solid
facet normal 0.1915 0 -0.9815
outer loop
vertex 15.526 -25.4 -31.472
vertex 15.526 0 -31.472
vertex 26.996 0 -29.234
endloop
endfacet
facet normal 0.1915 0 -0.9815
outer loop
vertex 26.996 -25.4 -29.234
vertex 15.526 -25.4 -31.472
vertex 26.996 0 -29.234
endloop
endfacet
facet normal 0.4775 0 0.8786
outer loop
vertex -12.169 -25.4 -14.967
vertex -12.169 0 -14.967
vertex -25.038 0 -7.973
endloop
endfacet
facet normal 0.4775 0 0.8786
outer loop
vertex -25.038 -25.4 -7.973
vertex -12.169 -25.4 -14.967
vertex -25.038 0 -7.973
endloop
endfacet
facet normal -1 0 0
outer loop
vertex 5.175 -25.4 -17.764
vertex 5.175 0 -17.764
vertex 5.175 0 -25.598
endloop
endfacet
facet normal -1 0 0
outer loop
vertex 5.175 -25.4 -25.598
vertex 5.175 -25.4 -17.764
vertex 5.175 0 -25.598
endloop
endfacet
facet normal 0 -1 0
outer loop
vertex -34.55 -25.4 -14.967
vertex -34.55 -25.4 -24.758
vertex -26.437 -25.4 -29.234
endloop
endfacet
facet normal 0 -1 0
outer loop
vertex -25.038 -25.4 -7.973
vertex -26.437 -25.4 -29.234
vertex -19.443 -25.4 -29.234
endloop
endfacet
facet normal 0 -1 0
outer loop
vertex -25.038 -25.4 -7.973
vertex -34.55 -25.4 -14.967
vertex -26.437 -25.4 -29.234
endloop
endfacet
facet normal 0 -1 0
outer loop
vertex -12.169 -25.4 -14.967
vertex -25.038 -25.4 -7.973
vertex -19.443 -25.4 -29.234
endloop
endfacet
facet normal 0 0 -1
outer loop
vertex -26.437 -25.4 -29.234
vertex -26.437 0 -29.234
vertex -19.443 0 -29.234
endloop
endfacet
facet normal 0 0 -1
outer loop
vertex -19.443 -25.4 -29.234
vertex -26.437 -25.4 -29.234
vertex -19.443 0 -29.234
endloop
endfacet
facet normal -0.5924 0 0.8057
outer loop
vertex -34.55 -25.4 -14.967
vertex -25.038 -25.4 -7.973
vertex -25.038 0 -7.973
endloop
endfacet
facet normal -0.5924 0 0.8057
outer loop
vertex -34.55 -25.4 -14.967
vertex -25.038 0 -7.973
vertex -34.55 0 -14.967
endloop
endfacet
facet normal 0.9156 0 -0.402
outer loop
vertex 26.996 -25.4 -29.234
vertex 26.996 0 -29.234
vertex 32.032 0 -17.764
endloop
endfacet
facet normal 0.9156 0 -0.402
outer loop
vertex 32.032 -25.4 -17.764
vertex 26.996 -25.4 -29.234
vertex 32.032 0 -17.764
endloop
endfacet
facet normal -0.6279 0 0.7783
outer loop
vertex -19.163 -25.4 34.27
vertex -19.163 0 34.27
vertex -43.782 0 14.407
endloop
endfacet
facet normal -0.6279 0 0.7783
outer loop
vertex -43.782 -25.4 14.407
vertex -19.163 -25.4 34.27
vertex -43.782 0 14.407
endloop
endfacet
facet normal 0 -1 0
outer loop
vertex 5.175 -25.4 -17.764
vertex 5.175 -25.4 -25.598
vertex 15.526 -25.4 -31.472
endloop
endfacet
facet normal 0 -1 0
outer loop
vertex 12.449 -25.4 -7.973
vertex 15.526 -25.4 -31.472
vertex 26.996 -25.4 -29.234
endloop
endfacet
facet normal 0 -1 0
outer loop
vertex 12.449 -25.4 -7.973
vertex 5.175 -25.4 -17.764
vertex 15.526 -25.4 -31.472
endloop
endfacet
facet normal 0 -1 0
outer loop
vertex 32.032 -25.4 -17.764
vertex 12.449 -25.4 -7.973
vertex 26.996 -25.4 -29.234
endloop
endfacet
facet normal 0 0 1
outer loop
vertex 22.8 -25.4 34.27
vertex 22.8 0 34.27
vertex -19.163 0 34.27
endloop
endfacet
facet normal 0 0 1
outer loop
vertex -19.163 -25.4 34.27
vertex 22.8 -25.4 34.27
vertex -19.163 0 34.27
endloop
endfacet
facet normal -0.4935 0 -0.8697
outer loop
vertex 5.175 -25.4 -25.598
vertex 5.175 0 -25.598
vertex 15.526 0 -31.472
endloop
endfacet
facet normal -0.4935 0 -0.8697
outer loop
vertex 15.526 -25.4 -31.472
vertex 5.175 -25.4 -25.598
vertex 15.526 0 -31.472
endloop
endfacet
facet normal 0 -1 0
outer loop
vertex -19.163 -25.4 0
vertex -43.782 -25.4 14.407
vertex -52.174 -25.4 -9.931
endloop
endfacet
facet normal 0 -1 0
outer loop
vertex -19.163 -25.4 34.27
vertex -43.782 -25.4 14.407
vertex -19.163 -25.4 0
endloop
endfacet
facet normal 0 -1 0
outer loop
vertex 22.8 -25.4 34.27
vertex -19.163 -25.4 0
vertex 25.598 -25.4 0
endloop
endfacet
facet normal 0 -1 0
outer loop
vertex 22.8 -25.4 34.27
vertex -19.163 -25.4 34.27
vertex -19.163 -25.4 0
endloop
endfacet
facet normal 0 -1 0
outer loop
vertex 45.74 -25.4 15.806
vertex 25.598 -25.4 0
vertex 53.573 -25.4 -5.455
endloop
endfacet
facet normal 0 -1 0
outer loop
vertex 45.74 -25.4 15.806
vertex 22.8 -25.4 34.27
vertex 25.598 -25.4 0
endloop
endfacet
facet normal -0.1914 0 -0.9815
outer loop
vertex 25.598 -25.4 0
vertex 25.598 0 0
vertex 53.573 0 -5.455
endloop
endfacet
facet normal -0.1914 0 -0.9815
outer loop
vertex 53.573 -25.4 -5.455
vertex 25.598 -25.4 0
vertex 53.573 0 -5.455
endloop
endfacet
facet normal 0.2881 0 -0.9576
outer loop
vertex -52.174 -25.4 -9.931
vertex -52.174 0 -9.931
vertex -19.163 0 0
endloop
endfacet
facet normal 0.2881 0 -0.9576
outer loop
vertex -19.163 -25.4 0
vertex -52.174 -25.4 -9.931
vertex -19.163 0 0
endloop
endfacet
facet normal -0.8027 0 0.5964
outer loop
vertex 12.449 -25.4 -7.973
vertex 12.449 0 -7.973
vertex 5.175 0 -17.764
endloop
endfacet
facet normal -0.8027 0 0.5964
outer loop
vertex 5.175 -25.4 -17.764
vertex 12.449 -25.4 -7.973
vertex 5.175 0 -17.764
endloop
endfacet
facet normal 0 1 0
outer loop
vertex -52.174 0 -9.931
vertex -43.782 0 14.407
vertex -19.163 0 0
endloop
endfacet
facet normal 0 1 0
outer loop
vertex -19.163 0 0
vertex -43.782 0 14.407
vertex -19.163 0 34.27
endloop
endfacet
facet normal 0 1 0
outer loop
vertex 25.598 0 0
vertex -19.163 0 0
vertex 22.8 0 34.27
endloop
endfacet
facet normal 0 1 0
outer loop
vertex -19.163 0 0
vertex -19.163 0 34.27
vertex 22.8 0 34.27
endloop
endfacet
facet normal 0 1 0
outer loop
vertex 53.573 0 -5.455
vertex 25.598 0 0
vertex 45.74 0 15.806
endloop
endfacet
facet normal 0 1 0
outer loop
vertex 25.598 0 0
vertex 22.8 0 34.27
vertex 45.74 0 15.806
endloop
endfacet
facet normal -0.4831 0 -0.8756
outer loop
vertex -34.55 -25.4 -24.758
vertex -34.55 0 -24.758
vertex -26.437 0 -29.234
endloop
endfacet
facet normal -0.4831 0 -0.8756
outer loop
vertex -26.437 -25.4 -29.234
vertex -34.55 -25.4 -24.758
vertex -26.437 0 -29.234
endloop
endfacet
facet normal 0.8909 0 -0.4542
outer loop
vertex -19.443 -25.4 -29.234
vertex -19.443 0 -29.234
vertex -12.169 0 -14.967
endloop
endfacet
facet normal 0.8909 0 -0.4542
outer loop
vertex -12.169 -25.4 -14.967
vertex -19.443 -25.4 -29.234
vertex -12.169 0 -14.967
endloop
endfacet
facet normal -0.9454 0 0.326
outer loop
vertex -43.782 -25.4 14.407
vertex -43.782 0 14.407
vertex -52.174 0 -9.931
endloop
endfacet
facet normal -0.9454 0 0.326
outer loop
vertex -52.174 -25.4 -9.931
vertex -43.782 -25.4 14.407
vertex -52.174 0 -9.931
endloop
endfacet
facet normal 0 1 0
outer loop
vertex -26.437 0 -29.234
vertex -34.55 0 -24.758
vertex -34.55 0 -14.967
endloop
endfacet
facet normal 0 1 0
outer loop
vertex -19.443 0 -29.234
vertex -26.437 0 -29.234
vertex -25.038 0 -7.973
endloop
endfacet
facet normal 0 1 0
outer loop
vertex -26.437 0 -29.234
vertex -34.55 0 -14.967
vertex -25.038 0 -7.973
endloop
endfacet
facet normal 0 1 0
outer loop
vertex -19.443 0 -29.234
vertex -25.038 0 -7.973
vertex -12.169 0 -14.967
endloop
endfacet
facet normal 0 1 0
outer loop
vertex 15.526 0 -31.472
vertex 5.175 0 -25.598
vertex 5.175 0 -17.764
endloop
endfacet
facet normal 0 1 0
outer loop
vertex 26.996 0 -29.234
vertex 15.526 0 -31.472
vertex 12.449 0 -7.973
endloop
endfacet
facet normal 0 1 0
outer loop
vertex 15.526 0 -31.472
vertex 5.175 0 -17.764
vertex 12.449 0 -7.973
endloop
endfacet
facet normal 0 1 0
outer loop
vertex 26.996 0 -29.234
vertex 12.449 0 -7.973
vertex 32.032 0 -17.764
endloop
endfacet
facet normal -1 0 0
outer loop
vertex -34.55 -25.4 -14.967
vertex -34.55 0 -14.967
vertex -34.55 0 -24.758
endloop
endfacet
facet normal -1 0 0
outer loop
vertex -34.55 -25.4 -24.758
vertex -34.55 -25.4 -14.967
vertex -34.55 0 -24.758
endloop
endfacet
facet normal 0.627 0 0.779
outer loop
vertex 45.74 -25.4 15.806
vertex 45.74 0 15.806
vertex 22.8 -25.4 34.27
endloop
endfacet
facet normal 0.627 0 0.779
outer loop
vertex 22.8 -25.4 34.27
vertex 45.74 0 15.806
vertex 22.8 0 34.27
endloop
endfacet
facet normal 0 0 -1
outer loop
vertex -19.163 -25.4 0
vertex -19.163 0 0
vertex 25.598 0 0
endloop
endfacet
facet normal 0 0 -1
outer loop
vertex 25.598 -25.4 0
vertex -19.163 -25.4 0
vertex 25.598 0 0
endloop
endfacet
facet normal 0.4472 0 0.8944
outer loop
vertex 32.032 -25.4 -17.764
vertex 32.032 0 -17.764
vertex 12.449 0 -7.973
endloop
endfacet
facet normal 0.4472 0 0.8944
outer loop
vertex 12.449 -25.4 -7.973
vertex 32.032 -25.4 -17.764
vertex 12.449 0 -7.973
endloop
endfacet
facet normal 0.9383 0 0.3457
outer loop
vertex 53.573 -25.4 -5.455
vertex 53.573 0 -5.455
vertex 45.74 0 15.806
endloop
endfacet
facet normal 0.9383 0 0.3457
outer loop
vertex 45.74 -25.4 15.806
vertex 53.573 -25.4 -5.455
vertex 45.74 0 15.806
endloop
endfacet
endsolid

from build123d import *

# Parameters (mm, degrees)
F1_DEPTH = 25.4
F3_DEPTH = 25.4


with BuildPart() as f1:
    # F0 (on Front) → F1 (new body)
    with BuildSketch(Plane.XZ):
        Polygon((-19.163234, 34.270018), (-43.781698, 14.407394), (-52.174352, -9.931311), (-19.163234, 0), (25.597604, 0), (53.573128, -5.455228), (45.739982, 15.806172), (22.800053, 34.270018), align=None)
    extrude(amount=F1_DEPTH)


with BuildPart() as f3:
    # F2 (on Front) → F3 (new body)
    with BuildSketch(Plane.XZ):
        Polygon((-12.169353, -14.966905), (-25.038095, -7.973025), (-34.549773, -14.966905), (-34.549773, -24.758339), (-26.436871, -29.234422), (-19.44299, -29.234422), align=None)
        Polygon((32.031979, -17.764458), (12.449107, -7.973025), (5.175473, -17.764458), (5.175473, -25.597606), (15.526418, -31.472467), (26.99638, -29.234422), align=None)
    extrude(amount=F3_DEPTH)


solid = Compound([f1.part, f3.part])
